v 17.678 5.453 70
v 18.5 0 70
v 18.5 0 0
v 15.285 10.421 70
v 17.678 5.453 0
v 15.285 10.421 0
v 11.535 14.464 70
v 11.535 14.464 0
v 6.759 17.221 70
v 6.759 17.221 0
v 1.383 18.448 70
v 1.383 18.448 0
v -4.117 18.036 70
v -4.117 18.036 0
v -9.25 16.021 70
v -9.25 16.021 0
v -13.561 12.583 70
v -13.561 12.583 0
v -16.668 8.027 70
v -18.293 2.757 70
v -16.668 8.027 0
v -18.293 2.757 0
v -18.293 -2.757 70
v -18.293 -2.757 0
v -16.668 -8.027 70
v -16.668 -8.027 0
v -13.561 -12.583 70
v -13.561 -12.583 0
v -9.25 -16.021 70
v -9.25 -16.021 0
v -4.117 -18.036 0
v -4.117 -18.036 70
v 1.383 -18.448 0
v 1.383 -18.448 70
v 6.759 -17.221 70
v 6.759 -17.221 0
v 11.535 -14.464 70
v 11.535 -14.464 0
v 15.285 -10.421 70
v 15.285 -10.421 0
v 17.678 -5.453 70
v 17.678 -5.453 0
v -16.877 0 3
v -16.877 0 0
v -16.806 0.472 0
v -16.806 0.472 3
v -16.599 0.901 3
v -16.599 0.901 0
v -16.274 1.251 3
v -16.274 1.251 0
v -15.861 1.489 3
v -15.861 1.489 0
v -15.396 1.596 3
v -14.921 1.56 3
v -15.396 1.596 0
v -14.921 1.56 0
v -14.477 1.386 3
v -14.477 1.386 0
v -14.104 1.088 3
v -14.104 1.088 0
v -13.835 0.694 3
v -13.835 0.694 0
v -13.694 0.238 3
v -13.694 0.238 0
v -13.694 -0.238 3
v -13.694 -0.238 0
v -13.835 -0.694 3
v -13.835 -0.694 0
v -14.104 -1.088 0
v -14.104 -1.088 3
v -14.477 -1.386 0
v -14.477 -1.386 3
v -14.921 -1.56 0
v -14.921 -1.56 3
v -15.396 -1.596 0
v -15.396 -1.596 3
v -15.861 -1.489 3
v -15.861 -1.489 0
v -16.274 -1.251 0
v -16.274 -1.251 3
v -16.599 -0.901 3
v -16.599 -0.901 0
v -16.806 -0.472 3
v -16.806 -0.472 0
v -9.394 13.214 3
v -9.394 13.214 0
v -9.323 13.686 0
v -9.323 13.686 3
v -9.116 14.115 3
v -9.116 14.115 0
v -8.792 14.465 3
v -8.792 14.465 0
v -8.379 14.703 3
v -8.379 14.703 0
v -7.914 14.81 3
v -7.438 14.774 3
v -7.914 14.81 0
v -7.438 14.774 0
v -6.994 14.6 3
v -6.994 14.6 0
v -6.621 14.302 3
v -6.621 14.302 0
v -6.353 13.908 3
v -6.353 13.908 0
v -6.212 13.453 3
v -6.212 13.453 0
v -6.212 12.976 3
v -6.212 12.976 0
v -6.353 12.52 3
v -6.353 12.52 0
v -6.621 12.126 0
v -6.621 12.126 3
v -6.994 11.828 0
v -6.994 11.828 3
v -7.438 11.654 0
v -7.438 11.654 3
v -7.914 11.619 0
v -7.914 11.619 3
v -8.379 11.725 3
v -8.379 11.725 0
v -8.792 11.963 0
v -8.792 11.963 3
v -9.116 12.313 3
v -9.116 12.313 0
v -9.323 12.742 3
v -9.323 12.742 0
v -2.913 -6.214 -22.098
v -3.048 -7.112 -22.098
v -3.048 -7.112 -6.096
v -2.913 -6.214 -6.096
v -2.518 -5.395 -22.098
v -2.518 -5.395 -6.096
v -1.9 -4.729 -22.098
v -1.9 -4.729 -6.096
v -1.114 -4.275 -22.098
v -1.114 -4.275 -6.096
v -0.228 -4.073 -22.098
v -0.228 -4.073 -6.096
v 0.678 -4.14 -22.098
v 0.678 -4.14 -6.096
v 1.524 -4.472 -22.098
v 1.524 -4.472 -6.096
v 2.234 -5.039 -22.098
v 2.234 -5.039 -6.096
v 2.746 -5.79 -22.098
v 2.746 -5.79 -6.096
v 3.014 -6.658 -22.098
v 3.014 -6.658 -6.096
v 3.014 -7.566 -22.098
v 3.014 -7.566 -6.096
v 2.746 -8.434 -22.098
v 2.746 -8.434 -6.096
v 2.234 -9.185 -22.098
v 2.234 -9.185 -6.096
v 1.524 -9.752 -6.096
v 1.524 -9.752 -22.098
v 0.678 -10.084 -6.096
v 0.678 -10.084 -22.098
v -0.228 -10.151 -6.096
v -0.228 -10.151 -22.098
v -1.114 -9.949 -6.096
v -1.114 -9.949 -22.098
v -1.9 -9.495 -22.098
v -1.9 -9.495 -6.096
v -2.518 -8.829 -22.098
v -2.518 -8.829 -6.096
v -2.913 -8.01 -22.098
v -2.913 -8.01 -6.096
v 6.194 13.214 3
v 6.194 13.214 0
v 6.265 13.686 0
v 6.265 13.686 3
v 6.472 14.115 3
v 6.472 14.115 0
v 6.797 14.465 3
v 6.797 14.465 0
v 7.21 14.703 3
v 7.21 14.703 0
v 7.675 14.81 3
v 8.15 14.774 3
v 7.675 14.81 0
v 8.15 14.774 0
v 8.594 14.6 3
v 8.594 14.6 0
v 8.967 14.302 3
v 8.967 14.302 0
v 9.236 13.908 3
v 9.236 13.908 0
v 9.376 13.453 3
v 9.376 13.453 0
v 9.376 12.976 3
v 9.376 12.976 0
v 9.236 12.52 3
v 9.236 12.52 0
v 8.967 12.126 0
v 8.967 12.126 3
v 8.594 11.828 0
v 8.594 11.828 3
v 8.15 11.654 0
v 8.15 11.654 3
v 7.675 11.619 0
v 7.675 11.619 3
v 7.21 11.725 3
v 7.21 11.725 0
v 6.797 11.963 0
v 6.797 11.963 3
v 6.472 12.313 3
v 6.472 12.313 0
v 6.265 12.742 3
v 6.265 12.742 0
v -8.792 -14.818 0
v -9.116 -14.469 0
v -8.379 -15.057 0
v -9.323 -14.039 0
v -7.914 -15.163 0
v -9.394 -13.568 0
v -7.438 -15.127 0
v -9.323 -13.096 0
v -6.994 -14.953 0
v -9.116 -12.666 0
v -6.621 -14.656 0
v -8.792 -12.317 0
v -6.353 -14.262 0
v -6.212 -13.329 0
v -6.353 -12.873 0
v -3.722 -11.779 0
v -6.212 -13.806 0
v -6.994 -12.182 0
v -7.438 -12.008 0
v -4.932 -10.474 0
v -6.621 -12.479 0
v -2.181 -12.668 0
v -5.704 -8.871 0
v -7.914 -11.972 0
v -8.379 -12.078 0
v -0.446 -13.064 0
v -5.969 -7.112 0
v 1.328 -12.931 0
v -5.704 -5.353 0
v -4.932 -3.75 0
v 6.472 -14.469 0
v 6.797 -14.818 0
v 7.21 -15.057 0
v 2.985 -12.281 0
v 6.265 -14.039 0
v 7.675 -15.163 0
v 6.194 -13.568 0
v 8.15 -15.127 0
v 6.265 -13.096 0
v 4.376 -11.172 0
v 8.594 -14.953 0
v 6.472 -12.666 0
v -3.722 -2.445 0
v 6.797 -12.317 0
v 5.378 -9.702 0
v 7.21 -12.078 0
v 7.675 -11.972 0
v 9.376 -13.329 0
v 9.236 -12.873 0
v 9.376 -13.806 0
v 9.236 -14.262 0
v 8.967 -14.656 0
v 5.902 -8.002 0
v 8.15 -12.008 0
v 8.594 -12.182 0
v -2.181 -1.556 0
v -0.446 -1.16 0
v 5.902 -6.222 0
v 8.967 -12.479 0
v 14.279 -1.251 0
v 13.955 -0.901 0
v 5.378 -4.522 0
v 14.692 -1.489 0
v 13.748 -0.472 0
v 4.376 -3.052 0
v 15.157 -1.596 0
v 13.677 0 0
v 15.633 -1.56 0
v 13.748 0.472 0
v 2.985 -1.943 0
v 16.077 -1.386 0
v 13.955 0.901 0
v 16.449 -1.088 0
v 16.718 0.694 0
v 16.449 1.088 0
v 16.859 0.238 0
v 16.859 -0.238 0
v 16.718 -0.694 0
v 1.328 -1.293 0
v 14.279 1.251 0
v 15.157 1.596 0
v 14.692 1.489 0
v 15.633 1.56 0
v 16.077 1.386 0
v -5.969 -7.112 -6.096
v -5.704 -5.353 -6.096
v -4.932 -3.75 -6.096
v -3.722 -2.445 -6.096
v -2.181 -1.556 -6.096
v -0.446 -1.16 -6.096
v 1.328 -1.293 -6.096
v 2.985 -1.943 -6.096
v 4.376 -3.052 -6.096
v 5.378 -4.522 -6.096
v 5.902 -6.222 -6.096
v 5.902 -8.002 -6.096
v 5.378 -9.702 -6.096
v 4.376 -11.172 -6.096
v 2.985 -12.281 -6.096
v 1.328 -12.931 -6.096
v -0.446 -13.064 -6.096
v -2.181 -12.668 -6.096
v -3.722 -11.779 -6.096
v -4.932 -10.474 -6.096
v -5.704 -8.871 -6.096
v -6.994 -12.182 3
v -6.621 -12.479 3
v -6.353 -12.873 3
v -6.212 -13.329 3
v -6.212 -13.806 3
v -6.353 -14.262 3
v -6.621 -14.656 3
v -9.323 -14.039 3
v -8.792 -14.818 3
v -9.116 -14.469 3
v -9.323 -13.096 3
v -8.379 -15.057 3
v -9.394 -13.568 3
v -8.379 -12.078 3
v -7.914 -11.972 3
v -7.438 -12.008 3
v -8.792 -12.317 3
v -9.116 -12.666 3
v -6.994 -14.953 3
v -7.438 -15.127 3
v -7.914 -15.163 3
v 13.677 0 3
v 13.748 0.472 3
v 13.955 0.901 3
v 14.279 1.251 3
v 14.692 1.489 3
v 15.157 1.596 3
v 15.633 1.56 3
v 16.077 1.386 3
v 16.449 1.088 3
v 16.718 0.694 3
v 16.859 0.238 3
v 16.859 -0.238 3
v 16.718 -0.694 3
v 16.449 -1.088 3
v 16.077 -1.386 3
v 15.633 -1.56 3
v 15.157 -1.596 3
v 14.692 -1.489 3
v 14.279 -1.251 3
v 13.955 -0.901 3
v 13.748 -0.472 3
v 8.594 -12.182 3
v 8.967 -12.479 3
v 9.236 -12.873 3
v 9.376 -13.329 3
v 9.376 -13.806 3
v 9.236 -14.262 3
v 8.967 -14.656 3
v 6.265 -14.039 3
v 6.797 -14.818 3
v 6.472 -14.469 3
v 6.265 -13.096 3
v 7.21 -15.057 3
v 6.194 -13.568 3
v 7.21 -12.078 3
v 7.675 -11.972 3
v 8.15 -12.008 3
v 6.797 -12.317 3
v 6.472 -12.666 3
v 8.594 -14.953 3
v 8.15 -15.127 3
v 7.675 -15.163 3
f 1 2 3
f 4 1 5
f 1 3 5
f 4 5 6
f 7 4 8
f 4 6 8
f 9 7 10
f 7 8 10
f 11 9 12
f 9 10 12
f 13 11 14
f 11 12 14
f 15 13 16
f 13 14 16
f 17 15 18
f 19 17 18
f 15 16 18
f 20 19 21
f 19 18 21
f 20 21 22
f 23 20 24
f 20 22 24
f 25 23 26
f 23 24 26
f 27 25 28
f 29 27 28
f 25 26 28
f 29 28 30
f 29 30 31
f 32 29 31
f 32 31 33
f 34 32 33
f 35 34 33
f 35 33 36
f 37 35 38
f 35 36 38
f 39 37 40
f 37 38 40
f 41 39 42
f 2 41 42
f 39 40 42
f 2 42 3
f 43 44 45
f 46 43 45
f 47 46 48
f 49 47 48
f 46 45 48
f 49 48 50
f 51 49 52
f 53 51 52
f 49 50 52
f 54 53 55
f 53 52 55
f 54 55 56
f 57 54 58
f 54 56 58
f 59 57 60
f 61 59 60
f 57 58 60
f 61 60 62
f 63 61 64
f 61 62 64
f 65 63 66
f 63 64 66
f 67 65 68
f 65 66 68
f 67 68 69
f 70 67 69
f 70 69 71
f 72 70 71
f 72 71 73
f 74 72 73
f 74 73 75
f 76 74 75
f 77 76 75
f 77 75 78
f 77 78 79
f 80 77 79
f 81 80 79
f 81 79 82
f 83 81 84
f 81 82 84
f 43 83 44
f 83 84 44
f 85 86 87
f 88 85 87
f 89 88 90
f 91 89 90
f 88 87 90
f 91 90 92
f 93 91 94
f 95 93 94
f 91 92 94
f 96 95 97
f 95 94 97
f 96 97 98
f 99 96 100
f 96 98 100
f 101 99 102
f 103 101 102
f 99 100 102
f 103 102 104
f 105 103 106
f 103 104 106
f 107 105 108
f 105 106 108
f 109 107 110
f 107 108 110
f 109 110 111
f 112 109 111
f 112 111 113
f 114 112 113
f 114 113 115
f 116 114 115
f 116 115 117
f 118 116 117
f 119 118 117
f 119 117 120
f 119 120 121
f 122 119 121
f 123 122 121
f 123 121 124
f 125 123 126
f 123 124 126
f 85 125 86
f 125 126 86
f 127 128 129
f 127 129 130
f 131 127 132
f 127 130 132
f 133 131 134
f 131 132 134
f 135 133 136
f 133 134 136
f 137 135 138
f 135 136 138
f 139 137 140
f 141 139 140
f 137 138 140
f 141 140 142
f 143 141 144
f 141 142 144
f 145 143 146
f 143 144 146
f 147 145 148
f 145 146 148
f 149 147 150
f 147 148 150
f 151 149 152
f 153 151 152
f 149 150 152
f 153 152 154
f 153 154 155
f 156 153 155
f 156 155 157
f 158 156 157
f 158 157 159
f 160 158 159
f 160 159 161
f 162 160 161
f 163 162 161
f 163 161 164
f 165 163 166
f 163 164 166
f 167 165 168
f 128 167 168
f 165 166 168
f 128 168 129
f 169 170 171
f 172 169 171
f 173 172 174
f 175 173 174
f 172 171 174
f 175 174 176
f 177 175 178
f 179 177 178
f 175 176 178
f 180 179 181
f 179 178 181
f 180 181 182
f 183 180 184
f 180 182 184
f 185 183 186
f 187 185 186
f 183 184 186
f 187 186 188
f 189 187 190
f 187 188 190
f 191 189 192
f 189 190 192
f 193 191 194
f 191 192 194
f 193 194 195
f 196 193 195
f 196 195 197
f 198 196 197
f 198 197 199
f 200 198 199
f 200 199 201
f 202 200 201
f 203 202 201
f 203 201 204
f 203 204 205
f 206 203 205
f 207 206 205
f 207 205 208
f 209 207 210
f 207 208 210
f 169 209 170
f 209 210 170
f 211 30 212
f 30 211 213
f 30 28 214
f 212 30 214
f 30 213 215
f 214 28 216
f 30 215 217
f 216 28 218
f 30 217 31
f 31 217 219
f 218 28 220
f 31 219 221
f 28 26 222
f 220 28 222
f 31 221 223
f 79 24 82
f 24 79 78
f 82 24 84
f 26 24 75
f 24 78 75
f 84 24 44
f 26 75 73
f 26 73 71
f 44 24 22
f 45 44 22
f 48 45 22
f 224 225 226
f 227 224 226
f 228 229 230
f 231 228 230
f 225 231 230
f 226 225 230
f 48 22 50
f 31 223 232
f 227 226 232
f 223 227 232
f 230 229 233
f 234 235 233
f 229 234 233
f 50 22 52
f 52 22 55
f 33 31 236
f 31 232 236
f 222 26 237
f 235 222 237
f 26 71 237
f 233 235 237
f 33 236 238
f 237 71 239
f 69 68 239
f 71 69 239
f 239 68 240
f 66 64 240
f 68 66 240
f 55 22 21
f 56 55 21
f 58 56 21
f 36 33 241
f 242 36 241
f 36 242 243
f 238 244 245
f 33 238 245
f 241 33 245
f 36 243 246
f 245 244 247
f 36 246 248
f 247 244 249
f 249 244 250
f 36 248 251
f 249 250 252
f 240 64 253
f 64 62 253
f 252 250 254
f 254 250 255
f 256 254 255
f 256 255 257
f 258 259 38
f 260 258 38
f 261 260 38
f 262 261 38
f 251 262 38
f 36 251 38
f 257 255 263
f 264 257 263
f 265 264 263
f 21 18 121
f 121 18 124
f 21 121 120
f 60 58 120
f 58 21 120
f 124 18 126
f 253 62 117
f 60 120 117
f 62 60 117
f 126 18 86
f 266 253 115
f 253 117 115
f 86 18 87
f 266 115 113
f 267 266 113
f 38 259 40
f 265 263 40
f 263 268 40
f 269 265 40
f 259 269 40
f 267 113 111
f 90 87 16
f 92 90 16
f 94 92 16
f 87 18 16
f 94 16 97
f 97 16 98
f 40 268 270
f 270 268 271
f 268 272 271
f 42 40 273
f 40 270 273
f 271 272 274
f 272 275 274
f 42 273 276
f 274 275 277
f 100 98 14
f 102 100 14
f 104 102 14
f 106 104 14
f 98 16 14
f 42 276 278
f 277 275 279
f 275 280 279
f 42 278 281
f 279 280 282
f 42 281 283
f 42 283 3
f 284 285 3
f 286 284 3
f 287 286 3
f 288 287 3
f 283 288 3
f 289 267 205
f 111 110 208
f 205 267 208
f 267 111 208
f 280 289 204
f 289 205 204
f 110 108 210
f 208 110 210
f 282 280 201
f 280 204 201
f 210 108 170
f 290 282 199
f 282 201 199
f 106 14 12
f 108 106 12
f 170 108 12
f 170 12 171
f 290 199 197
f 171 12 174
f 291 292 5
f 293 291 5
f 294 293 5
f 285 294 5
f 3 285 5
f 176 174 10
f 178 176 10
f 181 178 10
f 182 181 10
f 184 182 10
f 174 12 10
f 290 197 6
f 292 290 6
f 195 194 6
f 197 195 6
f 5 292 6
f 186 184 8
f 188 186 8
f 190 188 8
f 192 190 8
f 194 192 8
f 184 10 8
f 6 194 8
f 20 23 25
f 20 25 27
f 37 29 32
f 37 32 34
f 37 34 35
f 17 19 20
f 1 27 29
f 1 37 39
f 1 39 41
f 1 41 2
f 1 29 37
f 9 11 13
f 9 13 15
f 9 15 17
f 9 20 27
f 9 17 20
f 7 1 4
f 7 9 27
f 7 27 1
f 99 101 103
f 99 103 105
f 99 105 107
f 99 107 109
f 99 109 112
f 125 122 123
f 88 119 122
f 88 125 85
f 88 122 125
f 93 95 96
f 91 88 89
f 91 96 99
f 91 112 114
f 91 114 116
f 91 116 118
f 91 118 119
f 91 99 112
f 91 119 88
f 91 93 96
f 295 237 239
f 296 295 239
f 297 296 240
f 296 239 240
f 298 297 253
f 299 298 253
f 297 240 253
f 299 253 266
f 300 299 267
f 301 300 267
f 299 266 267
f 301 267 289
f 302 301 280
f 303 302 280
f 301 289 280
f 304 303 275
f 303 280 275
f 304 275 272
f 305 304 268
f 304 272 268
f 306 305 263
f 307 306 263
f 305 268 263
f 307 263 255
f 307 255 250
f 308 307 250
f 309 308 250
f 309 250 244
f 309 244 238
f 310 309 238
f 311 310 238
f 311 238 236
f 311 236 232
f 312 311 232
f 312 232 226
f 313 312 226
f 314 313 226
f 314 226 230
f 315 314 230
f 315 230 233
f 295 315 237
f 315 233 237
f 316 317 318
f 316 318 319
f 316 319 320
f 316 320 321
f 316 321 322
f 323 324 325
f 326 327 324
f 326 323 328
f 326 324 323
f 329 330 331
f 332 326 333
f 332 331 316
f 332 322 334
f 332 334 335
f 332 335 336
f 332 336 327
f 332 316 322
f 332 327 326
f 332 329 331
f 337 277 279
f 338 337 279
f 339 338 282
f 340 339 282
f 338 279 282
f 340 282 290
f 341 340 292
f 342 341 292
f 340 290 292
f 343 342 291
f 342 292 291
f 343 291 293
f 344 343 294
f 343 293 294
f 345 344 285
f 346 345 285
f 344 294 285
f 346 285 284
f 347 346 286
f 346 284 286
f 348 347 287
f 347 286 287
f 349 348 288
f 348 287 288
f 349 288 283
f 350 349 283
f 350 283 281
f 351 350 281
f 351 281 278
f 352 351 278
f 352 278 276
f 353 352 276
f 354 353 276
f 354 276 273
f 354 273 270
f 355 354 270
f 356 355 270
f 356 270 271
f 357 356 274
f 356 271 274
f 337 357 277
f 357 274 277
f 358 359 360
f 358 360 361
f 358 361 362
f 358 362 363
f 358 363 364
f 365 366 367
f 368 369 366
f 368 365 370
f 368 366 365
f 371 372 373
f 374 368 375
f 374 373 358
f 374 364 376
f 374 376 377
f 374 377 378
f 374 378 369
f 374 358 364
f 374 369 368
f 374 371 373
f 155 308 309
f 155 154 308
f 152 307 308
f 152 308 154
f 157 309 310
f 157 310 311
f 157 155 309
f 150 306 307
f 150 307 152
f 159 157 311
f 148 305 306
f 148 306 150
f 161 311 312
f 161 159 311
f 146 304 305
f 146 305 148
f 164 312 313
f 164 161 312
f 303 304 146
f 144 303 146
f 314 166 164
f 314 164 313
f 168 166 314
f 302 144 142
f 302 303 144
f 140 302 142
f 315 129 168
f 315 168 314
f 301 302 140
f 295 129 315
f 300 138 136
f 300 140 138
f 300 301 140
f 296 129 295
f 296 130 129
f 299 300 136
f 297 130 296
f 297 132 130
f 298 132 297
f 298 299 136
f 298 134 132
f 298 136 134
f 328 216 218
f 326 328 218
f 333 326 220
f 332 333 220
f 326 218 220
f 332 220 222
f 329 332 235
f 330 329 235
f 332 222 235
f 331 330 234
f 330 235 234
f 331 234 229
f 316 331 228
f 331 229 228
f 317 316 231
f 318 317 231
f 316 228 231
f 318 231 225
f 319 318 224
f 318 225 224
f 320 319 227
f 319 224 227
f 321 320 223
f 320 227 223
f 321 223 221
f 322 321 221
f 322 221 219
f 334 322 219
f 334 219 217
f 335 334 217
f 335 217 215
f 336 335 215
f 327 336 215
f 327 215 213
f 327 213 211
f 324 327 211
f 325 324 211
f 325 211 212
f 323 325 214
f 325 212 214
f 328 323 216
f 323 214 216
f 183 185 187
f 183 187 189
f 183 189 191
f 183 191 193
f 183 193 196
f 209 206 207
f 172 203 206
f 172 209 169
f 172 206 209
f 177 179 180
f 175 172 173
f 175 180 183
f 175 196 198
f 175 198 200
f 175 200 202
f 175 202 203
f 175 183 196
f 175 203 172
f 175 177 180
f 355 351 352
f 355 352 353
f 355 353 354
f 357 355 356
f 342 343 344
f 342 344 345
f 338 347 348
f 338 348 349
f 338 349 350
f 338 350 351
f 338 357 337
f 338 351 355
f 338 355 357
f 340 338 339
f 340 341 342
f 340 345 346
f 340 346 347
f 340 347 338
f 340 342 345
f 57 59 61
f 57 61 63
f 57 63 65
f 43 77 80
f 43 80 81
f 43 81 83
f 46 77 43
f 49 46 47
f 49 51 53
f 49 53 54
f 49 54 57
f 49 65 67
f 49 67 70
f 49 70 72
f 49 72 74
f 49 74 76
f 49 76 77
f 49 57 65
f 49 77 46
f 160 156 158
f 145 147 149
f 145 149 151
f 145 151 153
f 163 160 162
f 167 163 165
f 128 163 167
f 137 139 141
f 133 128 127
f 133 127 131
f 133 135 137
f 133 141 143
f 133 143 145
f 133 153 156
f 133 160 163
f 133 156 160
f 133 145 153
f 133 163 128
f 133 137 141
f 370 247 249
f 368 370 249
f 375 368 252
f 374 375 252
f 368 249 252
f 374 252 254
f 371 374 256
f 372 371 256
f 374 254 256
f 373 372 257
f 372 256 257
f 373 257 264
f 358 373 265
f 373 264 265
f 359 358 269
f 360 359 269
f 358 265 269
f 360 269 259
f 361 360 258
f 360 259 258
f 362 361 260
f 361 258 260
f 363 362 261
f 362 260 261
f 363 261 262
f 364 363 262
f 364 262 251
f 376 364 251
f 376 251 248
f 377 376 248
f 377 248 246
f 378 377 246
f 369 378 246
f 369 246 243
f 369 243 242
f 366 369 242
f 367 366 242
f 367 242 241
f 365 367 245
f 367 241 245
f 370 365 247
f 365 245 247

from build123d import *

# Parameters (mm, degrees)
SKETCH1_R           = 18.5
BOSS_EXTRUDE1_DEPTH = 70
SKETCH2_R           = 5.969
BOSS_EXTRUDE2_DEPTH = 6.096
SKETCH3_R           = 3.048
BOSS_EXTRUDE3_DEPTH = 16.002
SKETCH4_R           = 1.6
CUT_EXTRUDE1_DEPTH  = 3


with BuildPart() as part:
    # Sketch1 → Boss-Extrude1 (new body)
    with BuildSketch(Plane.XY):
        Circle(SKETCH1_R)
    extrude(amount=BOSS_EXTRUDE1_DEPTH)

    # Sketch2 → Boss-Extrude2 (add)
    with BuildSketch(Plane(origin=(0, 0, 0), x_dir=(-1, 0, 0), z_dir=(0, 0, -1))):
        with Locations((0, -7.112)):
            Circle(SKETCH2_R)
    extrude(amount=BOSS_EXTRUDE2_DEPTH)

    # Sketch3 → Boss-Extrude3 (add)
    with BuildSketch(Plane(origin=(0, 0, -6.096), x_dir=(-1, 0, 0), z_dir=(0, 0, -1))):
        with Locations((0, -7.112)):
            Circle(SKETCH3_R)
    extrude(amount=BOSS_EXTRUDE3_DEPTH)

    # Sketch4 → Cut-Extrude1 (cut)
    with BuildSketch(Plane(origin=(0, 0, 0), x_dir=(-1, 0, 0), z_dir=(0, 0, -1))):
        with Locations((-15.2766, 0)):
            Circle(SKETCH4_R)
        with Locations((15.2766, 0)):
            Circle(SKETCH4_R)
        with Locations((7.794229315, -13.567540858)):
            Circle(SKETCH4_R)
        with Locations((-7.794229315, -13.567540858)):
            Circle(SKETCH4_R)
        with Locations((-7.794229315, 13.214096537)):
            Circle(SKETCH4_R)
        with Locations((7.794229315, 13.214096537)):
            Circle(SKETCH4_R)
    extrude(amount=-CUT_EXTRUDE1_DEPTH, mode=Mode.SUBTRACT)


solid = part.part
